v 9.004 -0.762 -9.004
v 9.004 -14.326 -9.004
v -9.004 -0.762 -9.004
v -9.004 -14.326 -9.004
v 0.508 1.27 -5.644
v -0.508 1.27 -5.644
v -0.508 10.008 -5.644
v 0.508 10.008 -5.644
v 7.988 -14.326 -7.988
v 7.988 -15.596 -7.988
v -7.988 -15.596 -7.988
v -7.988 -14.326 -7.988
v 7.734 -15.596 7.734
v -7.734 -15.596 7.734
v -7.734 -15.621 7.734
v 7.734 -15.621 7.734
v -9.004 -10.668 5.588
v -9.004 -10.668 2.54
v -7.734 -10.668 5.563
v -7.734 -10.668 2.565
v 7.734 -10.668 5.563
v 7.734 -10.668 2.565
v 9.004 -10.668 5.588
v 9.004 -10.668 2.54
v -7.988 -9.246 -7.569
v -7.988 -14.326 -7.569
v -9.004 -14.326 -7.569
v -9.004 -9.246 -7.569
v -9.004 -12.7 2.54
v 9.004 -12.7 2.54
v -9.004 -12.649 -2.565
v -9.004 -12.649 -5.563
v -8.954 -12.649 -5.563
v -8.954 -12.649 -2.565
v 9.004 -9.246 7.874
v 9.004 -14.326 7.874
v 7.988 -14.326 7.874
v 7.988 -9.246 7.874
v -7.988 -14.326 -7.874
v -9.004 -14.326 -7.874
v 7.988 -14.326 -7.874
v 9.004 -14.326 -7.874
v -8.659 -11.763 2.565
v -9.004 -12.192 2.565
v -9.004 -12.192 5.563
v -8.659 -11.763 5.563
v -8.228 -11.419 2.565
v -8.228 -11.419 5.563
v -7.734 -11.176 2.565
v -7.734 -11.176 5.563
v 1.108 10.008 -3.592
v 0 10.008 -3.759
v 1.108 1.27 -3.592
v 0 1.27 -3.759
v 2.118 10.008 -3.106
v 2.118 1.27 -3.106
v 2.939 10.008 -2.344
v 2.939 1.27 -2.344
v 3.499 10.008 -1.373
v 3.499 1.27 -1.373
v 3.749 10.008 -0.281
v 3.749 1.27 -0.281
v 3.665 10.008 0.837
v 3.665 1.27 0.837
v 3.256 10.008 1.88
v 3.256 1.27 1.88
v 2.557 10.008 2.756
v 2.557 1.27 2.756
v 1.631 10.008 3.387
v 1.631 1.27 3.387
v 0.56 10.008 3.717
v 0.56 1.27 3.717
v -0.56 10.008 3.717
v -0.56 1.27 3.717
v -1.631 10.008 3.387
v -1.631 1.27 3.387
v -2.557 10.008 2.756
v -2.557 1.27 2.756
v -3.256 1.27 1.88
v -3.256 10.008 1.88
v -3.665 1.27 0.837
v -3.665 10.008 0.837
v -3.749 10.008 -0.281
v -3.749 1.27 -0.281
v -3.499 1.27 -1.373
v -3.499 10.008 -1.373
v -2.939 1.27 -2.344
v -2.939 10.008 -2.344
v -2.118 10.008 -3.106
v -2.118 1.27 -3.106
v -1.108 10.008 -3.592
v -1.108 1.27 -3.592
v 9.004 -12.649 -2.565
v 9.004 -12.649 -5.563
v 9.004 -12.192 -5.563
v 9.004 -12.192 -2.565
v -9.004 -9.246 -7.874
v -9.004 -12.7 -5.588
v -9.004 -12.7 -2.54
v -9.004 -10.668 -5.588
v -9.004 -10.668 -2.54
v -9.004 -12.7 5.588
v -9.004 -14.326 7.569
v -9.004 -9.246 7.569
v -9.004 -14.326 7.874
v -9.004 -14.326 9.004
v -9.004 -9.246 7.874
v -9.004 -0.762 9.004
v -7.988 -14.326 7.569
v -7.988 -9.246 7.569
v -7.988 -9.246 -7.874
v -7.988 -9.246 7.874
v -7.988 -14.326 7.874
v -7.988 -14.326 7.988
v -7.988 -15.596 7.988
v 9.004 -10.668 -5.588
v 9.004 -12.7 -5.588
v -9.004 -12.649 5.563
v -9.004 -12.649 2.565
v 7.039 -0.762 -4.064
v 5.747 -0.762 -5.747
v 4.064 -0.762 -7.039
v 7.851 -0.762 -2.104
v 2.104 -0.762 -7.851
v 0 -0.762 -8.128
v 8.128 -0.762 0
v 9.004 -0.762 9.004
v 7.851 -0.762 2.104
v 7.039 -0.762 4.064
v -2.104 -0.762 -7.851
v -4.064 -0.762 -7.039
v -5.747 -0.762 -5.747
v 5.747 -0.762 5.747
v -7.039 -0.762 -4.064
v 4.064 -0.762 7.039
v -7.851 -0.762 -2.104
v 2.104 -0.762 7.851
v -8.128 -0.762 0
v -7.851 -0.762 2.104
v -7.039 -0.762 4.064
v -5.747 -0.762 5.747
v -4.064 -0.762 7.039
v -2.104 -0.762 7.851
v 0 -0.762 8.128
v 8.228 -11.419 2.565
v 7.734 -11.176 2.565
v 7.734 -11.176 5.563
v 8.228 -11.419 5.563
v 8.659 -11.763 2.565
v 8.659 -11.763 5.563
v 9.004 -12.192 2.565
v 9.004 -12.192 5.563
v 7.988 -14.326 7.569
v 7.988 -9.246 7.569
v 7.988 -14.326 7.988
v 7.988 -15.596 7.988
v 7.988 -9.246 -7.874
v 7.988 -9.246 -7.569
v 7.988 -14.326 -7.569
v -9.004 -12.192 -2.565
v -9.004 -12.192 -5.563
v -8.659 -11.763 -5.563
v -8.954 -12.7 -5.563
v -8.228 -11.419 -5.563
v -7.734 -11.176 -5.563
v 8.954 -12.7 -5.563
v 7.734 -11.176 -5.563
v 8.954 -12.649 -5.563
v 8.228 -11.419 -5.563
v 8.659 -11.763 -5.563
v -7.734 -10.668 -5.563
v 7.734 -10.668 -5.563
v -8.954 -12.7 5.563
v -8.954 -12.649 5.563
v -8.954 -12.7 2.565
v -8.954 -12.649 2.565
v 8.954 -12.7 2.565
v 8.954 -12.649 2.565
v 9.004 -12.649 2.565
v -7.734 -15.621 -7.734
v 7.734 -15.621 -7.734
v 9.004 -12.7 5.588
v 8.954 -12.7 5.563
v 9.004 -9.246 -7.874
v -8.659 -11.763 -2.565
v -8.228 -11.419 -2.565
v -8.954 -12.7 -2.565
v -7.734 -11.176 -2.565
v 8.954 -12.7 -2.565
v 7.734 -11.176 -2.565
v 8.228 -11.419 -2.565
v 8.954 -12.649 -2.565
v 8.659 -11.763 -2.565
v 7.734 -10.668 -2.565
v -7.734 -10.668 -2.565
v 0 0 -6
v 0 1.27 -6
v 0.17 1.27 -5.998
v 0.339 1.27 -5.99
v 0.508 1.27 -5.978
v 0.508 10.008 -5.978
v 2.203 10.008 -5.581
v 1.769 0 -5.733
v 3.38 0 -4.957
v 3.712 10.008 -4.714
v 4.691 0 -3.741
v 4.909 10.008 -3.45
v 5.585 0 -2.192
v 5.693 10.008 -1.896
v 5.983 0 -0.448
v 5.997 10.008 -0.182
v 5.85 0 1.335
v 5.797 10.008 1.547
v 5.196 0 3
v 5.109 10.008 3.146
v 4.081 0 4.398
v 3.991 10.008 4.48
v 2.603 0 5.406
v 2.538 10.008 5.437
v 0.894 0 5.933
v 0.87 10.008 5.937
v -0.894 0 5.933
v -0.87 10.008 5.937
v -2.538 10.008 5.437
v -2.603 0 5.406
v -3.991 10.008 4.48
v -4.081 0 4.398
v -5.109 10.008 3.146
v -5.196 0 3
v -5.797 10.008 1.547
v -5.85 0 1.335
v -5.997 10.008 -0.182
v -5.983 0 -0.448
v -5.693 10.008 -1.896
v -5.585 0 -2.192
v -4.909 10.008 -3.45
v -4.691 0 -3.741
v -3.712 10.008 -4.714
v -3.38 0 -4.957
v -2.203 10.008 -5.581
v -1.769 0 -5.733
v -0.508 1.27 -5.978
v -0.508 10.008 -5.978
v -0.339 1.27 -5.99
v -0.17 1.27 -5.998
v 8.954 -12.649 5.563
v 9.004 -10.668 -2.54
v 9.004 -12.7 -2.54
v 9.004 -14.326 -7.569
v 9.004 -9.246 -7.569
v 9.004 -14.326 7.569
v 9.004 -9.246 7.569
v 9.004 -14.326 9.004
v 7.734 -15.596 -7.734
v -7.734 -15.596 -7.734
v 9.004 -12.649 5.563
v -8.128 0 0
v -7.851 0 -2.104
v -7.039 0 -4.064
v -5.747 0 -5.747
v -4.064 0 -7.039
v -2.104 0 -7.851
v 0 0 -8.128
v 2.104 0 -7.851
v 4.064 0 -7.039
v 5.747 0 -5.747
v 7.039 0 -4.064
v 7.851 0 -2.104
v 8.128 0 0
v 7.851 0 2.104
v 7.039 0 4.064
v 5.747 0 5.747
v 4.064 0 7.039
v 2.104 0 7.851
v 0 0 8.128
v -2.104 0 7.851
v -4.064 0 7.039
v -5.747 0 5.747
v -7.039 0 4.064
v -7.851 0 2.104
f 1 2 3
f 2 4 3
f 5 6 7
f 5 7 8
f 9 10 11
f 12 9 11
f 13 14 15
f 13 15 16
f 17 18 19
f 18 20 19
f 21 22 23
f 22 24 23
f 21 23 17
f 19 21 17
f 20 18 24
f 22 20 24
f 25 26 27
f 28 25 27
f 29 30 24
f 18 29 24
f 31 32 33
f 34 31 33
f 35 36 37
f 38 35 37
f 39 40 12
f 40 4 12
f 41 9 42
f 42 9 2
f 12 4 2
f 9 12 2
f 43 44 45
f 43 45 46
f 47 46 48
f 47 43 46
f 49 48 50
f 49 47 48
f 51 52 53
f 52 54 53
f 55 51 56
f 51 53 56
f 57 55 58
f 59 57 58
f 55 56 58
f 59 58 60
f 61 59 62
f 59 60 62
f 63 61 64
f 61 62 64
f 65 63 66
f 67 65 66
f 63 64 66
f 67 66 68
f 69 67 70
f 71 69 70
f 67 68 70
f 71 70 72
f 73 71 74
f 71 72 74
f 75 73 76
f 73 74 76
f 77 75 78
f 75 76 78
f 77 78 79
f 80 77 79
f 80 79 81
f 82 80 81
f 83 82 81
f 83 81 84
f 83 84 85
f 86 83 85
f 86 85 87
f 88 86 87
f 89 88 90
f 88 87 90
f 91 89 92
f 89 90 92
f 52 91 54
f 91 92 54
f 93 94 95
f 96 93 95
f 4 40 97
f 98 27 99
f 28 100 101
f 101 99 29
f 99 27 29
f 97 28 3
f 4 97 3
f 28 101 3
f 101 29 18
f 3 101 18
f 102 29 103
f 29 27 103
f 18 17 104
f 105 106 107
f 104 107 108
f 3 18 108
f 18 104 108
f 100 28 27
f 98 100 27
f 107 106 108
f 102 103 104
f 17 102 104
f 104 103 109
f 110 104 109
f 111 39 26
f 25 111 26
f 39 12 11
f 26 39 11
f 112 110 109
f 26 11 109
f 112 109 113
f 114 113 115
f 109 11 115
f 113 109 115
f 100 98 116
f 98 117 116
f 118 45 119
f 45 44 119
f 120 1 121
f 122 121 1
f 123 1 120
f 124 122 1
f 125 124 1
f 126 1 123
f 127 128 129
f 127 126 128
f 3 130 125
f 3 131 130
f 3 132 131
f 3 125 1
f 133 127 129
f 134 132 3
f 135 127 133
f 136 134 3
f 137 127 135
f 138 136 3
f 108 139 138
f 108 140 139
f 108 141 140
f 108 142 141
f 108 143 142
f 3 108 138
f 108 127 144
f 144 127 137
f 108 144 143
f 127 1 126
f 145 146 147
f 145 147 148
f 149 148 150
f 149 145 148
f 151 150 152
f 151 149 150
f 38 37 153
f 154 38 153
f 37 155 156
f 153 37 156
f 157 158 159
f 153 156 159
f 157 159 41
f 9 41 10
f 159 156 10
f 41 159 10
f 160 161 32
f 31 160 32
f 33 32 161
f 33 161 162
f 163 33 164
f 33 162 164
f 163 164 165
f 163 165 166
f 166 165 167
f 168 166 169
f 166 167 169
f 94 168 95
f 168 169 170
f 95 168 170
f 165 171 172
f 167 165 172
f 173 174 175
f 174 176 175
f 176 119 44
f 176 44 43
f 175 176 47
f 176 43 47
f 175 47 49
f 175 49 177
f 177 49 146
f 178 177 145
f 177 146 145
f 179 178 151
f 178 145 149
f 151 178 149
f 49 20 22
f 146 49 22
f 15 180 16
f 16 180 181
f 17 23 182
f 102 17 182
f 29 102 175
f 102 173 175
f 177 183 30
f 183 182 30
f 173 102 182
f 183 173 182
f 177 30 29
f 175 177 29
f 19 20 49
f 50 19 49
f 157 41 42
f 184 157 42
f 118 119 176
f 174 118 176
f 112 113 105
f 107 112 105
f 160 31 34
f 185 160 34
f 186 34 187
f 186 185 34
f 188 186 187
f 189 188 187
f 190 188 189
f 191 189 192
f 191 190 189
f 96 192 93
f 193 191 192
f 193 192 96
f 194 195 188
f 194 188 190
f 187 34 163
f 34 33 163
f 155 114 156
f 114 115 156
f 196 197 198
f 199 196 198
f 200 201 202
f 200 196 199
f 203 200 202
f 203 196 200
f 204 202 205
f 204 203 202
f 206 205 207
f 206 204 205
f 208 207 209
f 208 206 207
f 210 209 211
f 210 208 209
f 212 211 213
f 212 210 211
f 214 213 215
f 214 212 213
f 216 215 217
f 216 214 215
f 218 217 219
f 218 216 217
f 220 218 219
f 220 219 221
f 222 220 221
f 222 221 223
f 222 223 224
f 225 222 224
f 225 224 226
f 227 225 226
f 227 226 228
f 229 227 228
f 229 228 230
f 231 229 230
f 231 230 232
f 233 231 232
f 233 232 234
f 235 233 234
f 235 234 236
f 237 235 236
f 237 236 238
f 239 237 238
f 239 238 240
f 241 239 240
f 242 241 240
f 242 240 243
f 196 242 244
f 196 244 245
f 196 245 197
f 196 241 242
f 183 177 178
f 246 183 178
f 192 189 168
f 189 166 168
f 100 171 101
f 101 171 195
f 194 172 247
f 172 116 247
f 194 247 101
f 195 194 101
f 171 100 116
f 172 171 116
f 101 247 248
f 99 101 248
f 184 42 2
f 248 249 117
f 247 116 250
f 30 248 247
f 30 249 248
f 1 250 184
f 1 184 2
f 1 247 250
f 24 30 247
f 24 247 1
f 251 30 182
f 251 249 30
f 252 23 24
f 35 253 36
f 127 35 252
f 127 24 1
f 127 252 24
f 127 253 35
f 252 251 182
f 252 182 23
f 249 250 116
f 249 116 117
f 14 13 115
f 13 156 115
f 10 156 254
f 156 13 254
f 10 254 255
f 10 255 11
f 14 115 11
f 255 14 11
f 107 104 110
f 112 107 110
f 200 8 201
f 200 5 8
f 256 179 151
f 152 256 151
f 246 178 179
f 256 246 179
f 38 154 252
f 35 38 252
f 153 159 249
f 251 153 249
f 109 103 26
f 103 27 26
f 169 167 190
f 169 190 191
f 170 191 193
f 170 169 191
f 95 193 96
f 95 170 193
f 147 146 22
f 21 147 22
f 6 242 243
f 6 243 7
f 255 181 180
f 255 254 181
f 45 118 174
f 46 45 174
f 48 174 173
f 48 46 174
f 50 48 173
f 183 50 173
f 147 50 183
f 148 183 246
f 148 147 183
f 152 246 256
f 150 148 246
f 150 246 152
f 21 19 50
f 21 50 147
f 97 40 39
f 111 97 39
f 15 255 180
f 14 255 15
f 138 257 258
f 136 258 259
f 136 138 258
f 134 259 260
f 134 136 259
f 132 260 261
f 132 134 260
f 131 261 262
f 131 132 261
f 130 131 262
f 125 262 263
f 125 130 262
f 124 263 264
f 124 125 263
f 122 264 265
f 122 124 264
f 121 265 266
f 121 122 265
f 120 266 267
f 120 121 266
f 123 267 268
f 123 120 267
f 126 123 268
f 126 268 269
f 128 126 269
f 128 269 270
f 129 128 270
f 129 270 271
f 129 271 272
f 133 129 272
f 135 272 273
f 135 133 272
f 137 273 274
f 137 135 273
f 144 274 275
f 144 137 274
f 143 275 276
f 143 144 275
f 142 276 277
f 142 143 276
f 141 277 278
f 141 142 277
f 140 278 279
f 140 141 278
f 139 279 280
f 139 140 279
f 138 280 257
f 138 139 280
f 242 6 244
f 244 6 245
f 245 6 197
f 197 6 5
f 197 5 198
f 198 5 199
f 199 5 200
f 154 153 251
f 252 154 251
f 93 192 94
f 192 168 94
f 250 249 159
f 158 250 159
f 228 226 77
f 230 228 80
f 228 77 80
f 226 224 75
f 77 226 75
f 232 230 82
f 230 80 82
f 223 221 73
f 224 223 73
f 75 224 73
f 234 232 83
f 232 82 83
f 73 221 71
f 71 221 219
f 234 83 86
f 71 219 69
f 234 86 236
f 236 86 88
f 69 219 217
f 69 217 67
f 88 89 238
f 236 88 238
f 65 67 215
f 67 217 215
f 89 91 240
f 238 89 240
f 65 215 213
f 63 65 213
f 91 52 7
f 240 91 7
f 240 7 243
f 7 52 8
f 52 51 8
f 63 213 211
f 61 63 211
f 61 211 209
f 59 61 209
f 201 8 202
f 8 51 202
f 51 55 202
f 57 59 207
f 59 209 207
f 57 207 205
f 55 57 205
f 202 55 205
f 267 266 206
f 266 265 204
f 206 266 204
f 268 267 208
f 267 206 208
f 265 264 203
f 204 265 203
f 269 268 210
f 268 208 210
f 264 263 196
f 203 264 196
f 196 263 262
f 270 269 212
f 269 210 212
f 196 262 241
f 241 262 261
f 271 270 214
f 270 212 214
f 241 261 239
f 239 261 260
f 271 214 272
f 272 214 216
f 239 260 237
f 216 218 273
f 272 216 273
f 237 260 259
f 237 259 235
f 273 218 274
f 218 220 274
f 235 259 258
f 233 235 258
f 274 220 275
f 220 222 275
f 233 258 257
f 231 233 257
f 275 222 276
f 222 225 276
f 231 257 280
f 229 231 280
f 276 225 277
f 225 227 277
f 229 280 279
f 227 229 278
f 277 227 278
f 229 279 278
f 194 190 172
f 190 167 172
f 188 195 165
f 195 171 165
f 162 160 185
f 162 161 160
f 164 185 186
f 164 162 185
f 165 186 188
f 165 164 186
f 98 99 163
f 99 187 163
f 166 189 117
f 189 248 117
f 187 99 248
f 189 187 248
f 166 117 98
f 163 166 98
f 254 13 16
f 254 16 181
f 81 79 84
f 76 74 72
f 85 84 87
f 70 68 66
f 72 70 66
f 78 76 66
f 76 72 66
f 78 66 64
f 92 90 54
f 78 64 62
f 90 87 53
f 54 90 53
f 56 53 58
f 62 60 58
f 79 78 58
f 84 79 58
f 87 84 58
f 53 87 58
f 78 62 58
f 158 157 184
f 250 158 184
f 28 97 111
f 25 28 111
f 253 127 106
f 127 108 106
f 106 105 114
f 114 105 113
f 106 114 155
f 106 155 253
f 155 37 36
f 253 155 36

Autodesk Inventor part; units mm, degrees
sketch "Sketch_1" plane through (0, 0, 0) normal (1, 0, 0) x (0, 1, 0)
  line L0 (0, 9.0043) -> (-15.5956, 9.0043)
  line L1 (-15.5956, 9.0043) -> (-15.5956, -9.0043)
  line L2 (-15.5956, -9.0043) -> (0, -9.0043)
  line L3 (0, -9.0043) -> (0, 9.0043)
extrude "Extrusion1" add sketch "Sketch_1" along normal mid plane 18.0086
sketch "Sketch_2" plane through (0, 0, 0) normal (0, 1, 0) x (-1, 0, 0)
  line L0 (12.2936, -12.2936) -> (12.2936, 12.2936)
  line L1 (12.2936, 12.2936) -> (-12.2936, 12.2936)
  line L2 (-12.2936, 12.2936) -> (-12.2936, -12.2936)
  line L3 (-12.2936, -12.2936) -> (12.2936, -12.2936)
  circle A0 centre (0, 0) radius 8.128
extrude "Extrusion2" cut sketch "Sketch_2" along normal mid plane 1.524
sketch "Sketch_3" plane through (0, -15.5956, 0) normal (0, 1, 0) x (1, 0, 0)
  line L0 (-11.5316, 11.5316) -> (-11.5316, -11.5316)
  line L1 (-11.5316, -11.5316) -> (11.5316, -11.5316)
  line L2 (11.5316, -11.5316) -> (11.5316, 11.5316)
  line L3 (11.5316, 11.5316) -> (-11.5316, 11.5316)
  line L4 (-7.9883, 7.9883) -> (-7.9883, -7.9883)
  line L5 (-7.9883, -7.9883) -> (7.9883, -7.9883)
  line L6 (7.9883, -7.9883) -> (7.9883, 7.9883)
  line L7 (7.9883, 7.9883) -> (-7.9883, 7.9883)
extrude "Extrusion3" cut sketch "Sketch_3" along normal mid plane 2.54
sketch "Sketch_4" plane through (0, -14.3256, 0) normal (0, 1, 0) x (1, 0, 0)
  line L0 (-12.446, 12.446) -> (-12.446, -12.446)
  line L1 (-12.446, -12.446) -> (12.446, -12.446)
  line L2 (12.446, -12.446) -> (12.446, 12.446)
  line L3 (12.446, 12.446) -> (-12.446, 12.446)
  line L4 (-11.5316, -7.5692) -> (-7.9883, -7.5692)
  line L5 (-7.9883, -7.5692) -> (-7.9883, -7.874)
  line L6 (-7.9883, -7.874) -> (-11.5316, -7.874)
  line L7 (-11.5316, -7.874) -> (-11.5316, -11.5316)
  line L8 (-11.5316, -11.5316) -> (11.5316, -11.5316)
  line L9 (11.5316, -11.5316) -> (11.5316, -7.874)
  line L10 (11.5316, -7.874) -> (7.9883, -7.874)
  line L11 (7.9883, -7.874) -> (7.9883, -7.5692)
  line L12 (7.9883, -7.5692) -> (11.5316, -7.5692)
  line L13 (11.5316, -7.5692) -> (11.5316, 7.5692)
  line L14 (11.5316, 7.5692) -> (7.9883, 7.5692)
  line L15 (7.9883, 7.5692) -> (7.9883, 7.874)
  line L16 (7.9883, 7.874) -> (11.5316, 7.874)
  line L17 (11.5316, 7.874) -> (11.5316, 11.5316)
  line L18 (11.5316, 11.5316) -> (-11.5316, 11.5316)
  line L19 (-11.5316, 11.5316) -> (-11.5316, 7.874)
  line L20 (-11.5316, 7.874) -> (-7.9883, 7.874)
  line L21 (-7.9883, 7.874) -> (-7.9883, 7.5692)
  line L22 (-7.9883, 7.5692) -> (-11.5316, 7.5692)
  line L23 (-11.5316, 7.5692) -> (-11.5316, -7.5692)
extrude "Extrusion4" cut sketch "Sketch_4" along normal mid plane 10.16
sketch "Sketch_5" plane through (0, -14.3256, 0) normal (0, 1, 0) x (1, 0, 0)
  line L0 (-7.7343, 7.7343) -> (-7.7343, -7.7343)
  line L1 (-7.7343, -7.7343) -> (7.7343, -7.7343)
  line L2 (7.7343, -7.7343) -> (7.7343, 7.7343)
  line L3 (7.7343, 7.7343) -> (-7.7343, 7.7343)
extrude "Extrusion5" add sketch "Sketch_5" against normal blind 1.2954
sketch "Sketch_6" plane through (9.0043, 0, 0) normal (1, 0, 0) x (0, 0, -1)
  line L0 (2.54, -10.668) -> (2.54, -12.7)
  line L1 (2.54, -12.7) -> (5.588, -12.7)
  line L2 (5.588, -12.7) -> (5.588, -10.668)
  line L3 (5.588, -10.668) -> (2.54, -10.668)
extrude "Extrusion6" cut sketch "Sketch_6" against normal blind 18.0086
sketch "Sketch_7" plane through (9.0043, 0, 0) normal (1, 0, 0) x (0, 0, -1)
  line L0 (-5.588, -10.668) -> (-5.588, -12.7)
  line L1 (-5.588, -12.7) -> (-2.54, -12.7)
  line L2 (-2.54, -12.7) -> (-2.54, -10.668)
  line L3 (-2.54, -10.668) -> (-5.588, -10.668)
extrude "Extrusion7" cut sketch "Sketch_7" against normal blind 18.0086
sketch "Sketch_8" plane through (0, 0, 4.064) normal (0, 0, 1) x (1, 0, 0)
  line L0 (-9.0043, -12.6492) -> (-8.9535, -12.6492)
  line L1 (-8.9535, -12.6492) -> (-8.9535, -12.7)
  line L2 (-8.9535, -12.7) -> (8.9535, -12.7)
  line L3 (8.9535, -12.7) -> (8.9535, -12.6492)
  line L4 (8.9535, -12.6492) -> (9.0043, -12.6492)
  line L5 (9.0043, -12.6492) -> (9.0043, -12.192)
  arc A0 (9.0043, -12.192) -> (7.7343, -11.176) centre (6.8661, -13.563) ccw
  line L6 (7.7343, -11.176) -> (7.7343, -10.668)
  line L7 (7.7343, -10.668) -> (-7.7343, -10.668)
  line L8 (-7.7343, -10.668) -> (-7.7343, -11.176)
  arc A1 (-7.7343, -11.176) -> (-9.0043, -12.192) centre (-6.8661, -13.563) ccw
  line L9 (-9.0043, -12.192) -> (-9.0043, -12.6492)
extrude "Extrusion8" add sketch "Sketch_8" along normal mid plane 2.9972
sketch "Sketch_9" plane through (0, 0, -4.064) normal (0, 0, 1) x (1, 0, 0)
  line L0 (-9.0043, -12.6492) -> (-8.9535, -12.6492)
  line L1 (-8.9535, -12.6492) -> (-8.9535, -12.7)
  line L2 (-8.9535, -12.7) -> (8.9535, -12.7)
  line L3 (8.9535, -12.7) -> (8.9535, -12.6492)
  line L4 (8.9535, -12.6492) -> (9.0043, -12.6492)
  line L5 (9.0043, -12.6492) -> (9.0043, -12.192)
  arc A0 (9.0043, -12.192) -> (7.7343, -11.176) centre (6.8661, -13.563) ccw
  line L6 (7.7343, -11.176) -> (7.7343, -10.668)
  line L7 (7.7343, -10.668) -> (-7.7343, -10.668)
  line L8 (-7.7343, -10.668) -> (-7.7343, -11.176)
  arc A1 (-7.7343, -11.176) -> (-9.0043, -12.192) centre (-6.8661, -13.563) ccw
  line L9 (-9.0043, -12.192) -> (-9.0043, -12.6492)
extrude "Extrusion9" add sketch "Sketch_9" along normal mid plane 2.9972
sketch "Sketch_11" plane through (0, 0, 0) normal (1, 0, 0) x (0, 1, 0)
  line L0 (0, 0) -> (10.0076, 0)
  line L1 (0, -3.7592) -> (0, -6)
  line L2 (0, -6) -> (10.0076, -6)
  line L3 (10.0076, -6) -> (10.0076, -3.7592)
  line L4 (10.0076, -3.7592) -> (0, -3.7592)
revolve "Revolution1" add sketch "Sketch_11" angle 360 about axis through (0, 0, 0) along (0, -1, 0)
thread "Thread1" size "M12x1" class "6g" standard "ISO Metric profile" full length
sketch "Sketch_15" plane through (0, 0, 0) normal (0, 1, 0) x (-1, 0, 0)
  line L0 (0.508, -5.6444) -> (-0.508, -5.6444)
  line L1 (-0.508, -5.6444) -> (-0.508, -6.4064)
  line L2 (-0.508, -6.4064) -> (0.508, -6.4064)
  line L3 (0.508, -6.4064) -> (0.508, -5.6444)
extrude "Extrusion10" cut sketch "Sketch_15" along normal blind 50.8
sketch "Sketch_18" plane through (0, 0, 0) normal (1, 0, 0) x (0, 1, 0)
  line L0 (0, 0) -> (1.27, 0)
  line L1 (1.27, 0) -> (1.27, -6)
  line L2 (1.27, -6) -> (0, -6)
  line L3 (0, -6) -> (0, 0)
  line L4 (0, 0) -> (1.27, 0)
revolve "Revolution2" add sketch "Sketch_18" angle 360 about axis through (0, 0, 0) along (0, -1, 0)
ref_plane "body_to_dummy_XY" through (0, 0, 0) normal (0, 1, 0) x (1, 0, 0)
ref_plane "body_to_dummy_YZ" through (0, 0, 0) normal (1, 0, 0) x (0, 0, -1)
ref_plane "body_to_dummy_ZX" through (0, 0, 0) normal (0, 0, -1) x (0, 1, 0)
ref_plane "body_to_hex_nut_XY" through (0, 0, 0) normal (0, 1, 0) x (1, 0, 0)
ref_plane "body_to_hex_nut_YZ" through (0, 0, 0) normal (1, 0, 0) x (0, 0, -1)
ref_plane "body_to_hex_nut_ZX" through (0, 0, 0) normal (0, 0, -1) x (0, 1, 0)
ref_plane "body_to_hex_nut_black_XY" through (0, 2.5146, 0) normal (0, 1, 0) x (1, 0, 0)
ref_plane "body_to_hex_nut_black_YZ" through (0, 2.5146, 0) normal (1, 0, 0) x (0, 0, -1)
ref_plane "body_to_hex_nut_black_ZX" through (0, 2.5146, 0) normal (0, 0, -1) x (0, 1, 0)
ref_plane "body_to_lockwasher_XY" through (0, 2.0066, 0) normal (0, 1, 0) x (1, 0, 0)
ref_plane "body_to_lockwasher_YZ" through (0, 2.0066, 0) normal (1, 0, 0) x (0, 0, -1)
ref_plane "body_to_lockwasher_ZX" through (0, 2.0066, 0) normal (0, 0, -1) x (0, 1, 0)
ref_plane "body_to_pins_XY" through (0, -15.5956, 0) normal (0, 1, 0) x (1, 0, 0)
ref_plane "body_to_pins_YZ" through (0, -15.5956, 0) normal (1, 0, 0) x (0, 0, -1)
ref_plane "body_to_pins_ZX" through (0, -15.5956, 0) normal (0, 0, -1) x (0, 1, 0)
ref_plane "body_to_toggles_XY" through (0, 10.0076, 0) normal (0, -1, 0) x (1, 0, 0)
ref_plane "body_to_toggles_YZ" through (0, 10.0076, 0) normal (1, 0, 0) x (0, 0, 1)
ref_plane "body_to_toggles_ZX" through (0, 10.0076, 0) normal (0, 0, 1) x (0, -1, 0)
properties part number "tl-cap"
